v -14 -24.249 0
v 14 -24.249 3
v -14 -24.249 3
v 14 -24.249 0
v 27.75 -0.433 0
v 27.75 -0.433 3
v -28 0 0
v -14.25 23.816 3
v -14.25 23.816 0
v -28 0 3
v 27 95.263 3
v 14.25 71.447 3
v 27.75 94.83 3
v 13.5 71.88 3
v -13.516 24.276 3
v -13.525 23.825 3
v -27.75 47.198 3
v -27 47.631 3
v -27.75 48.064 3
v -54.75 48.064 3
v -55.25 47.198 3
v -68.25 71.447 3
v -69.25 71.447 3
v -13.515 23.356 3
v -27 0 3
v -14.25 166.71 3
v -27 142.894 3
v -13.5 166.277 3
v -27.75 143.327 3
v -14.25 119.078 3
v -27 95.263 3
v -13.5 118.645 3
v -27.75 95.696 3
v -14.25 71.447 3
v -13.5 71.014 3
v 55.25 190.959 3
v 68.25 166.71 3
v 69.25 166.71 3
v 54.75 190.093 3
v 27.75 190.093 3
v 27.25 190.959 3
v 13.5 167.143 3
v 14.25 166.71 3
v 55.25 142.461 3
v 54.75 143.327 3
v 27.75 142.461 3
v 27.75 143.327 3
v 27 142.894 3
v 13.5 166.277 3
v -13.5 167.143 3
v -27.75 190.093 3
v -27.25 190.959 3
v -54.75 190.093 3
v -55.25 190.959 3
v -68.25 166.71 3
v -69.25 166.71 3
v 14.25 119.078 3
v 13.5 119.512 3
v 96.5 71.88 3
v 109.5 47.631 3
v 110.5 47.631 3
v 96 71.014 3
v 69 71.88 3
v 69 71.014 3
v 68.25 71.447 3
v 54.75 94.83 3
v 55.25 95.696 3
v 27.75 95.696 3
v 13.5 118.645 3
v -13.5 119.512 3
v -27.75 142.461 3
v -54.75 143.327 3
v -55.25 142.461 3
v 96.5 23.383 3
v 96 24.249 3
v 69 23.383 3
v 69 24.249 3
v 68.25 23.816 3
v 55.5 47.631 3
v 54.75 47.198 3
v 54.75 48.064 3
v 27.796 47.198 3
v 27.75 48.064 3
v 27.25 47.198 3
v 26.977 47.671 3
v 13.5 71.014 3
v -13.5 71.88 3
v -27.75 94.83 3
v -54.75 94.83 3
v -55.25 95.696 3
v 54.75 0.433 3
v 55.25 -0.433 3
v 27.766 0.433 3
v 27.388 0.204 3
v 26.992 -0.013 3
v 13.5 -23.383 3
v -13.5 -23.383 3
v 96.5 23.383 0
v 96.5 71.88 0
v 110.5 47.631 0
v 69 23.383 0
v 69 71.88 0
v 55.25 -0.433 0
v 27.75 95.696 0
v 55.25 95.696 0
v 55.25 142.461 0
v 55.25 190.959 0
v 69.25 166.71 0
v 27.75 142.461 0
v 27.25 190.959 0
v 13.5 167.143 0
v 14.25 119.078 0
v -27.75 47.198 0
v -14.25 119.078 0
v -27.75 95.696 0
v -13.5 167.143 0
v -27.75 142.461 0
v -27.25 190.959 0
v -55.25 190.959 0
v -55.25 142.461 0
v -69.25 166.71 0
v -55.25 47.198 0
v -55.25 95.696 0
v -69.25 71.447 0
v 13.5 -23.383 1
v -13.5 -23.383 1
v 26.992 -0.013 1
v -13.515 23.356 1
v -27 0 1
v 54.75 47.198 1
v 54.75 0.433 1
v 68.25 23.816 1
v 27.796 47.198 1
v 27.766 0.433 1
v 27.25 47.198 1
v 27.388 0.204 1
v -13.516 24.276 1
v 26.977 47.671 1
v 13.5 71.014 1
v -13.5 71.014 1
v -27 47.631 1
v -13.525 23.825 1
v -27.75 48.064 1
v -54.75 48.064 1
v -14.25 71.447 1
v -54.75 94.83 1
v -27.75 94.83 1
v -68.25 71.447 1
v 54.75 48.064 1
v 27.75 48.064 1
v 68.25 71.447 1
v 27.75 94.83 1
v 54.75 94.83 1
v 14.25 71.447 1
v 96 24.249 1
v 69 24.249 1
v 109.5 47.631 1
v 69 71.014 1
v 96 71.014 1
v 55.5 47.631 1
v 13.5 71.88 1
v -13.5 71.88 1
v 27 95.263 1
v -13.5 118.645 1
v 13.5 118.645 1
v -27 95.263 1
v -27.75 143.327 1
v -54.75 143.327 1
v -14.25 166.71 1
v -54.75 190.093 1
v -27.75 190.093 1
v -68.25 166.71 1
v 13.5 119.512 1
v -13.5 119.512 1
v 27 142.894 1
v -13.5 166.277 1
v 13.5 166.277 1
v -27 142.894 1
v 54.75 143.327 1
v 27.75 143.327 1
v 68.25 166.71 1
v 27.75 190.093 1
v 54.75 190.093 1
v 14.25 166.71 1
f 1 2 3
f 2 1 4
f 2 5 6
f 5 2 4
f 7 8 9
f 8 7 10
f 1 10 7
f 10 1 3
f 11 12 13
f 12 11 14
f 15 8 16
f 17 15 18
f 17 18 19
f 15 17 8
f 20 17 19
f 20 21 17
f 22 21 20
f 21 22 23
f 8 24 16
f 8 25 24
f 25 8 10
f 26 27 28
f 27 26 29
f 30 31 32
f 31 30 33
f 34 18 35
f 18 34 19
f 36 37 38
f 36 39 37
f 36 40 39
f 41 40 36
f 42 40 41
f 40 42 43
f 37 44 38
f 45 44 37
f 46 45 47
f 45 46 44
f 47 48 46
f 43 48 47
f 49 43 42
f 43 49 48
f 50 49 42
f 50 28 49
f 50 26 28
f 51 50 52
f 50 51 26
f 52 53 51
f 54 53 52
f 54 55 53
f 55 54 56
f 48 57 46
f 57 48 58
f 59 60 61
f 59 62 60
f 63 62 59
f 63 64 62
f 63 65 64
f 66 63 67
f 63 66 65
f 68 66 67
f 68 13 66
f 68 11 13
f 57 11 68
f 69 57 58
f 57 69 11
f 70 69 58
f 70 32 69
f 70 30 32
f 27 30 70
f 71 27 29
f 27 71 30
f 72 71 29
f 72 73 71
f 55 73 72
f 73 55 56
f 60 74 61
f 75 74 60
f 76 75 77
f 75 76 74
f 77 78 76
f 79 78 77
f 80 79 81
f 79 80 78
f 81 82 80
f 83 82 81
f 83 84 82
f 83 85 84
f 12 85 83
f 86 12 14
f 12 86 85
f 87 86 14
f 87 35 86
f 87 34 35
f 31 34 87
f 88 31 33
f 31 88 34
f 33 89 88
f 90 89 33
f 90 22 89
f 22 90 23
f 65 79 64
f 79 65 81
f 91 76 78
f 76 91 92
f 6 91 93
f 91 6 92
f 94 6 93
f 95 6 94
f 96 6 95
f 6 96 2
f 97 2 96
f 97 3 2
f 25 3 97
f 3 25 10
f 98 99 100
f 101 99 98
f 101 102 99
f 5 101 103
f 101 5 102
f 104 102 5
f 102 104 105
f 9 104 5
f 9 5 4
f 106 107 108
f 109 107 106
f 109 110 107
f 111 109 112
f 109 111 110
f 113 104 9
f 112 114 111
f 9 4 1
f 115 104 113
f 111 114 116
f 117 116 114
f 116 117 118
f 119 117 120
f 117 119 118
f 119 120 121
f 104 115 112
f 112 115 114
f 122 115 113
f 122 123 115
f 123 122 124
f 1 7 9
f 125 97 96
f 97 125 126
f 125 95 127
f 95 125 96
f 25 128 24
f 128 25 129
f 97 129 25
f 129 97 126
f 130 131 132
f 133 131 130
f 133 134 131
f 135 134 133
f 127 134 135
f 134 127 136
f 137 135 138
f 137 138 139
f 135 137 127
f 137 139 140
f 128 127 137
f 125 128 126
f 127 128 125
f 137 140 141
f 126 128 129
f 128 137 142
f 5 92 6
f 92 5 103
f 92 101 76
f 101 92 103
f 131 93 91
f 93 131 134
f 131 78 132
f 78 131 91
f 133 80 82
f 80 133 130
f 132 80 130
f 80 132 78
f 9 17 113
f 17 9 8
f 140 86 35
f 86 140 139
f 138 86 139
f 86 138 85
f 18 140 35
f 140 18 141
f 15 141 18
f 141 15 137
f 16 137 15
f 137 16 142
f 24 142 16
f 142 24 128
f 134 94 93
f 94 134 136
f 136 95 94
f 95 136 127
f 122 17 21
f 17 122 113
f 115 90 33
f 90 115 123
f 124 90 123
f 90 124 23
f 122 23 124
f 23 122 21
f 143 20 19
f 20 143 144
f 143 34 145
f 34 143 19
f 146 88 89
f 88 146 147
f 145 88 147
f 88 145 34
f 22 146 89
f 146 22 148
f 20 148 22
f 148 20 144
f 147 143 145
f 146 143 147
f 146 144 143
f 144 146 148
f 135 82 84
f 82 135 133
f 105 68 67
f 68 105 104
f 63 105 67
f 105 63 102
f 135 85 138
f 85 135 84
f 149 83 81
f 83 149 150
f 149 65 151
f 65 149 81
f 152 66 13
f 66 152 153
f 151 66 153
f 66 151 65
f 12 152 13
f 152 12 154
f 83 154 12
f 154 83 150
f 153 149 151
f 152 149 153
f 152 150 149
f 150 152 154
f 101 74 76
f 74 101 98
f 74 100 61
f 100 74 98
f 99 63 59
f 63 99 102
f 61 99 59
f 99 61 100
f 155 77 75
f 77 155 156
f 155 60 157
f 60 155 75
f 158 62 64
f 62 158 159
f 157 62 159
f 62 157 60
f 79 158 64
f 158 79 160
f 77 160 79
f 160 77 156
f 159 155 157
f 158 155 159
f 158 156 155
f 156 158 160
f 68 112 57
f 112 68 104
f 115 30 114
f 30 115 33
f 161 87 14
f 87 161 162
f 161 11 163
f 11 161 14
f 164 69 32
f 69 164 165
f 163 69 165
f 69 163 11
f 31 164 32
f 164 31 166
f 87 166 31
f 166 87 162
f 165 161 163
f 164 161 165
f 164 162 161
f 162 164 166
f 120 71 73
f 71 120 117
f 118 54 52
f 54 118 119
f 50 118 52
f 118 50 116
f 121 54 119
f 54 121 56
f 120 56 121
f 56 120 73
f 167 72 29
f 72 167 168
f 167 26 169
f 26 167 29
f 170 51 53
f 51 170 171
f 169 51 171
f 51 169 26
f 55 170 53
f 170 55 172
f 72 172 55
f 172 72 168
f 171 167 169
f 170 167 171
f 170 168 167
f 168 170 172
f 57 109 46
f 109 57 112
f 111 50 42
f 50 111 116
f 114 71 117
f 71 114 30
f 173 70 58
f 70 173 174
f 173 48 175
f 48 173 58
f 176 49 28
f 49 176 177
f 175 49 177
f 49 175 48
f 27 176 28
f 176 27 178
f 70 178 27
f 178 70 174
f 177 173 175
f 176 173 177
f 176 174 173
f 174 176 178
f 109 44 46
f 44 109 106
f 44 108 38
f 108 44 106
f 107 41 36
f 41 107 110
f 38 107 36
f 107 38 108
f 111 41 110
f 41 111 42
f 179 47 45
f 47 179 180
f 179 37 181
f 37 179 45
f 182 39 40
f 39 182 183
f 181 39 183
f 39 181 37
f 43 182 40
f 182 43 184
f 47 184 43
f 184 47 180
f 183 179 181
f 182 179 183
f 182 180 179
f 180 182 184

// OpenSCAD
$fn = 150;

union() {
	difference() {
		union() {
			translate(v = [0.0, 0.0, 0]) {
				difference() {
					cylinder($fn = 6, d = 56.0, h = 3.0);
					translate(v = [0, 0, 1.0]) {
						cylinder($fn = 6, d = 54.0, h = 3.0);
					}
				}
			}
			translate(v = [41.25, 23.81569860407206, 0]) {
				difference() {
					cylinder($fn = 6, d = 56.0, h = 3.0);
					translate(v = [0, 0, 1.0]) {
						cylinder($fn = 6, d = 54.0, h = 3.0);
					}
				}
			}
			translate(v = [0.0, 47.63139720814412, 0]) {
				difference() {
					cylinder($fn = 6, d = 56.0, h = 3.0);
					translate(v = [0, 0, 1.0]) {
						cylinder($fn = 6, d = 54.0, h = 3.0);
					}
				}
			}
		}
		translate(v = [13.75, 23.824673200287624, 1.0]) {
			cylinder(d = 54.55, h = 3.0);
		}
	}
	translate(v = [-41.25, 71.44709581221619, 0]) {
		difference() {
			cylinder($fn = 6, d = 56.0, h = 3.0);
			translate(v = [0, 0, 1.0]) {
				cylinder($fn = 6, d = 54.0, h = 3.0);
			}
		}
	}
	translate(v = [41.25, 71.44709581221619, 0]) {
		difference() {
			cylinder($fn = 6, d = 56.0, h = 3.0);
			translate(v = [0, 0, 1.0]) {
				cylinder($fn = 6, d = 54.0, h = 3.0);
			}
		}
	}
	translate(v = [82.5, 47.63139720814412, 0]) {
		difference() {
			cylinder($fn = 6, d = 56.0, h = 3.0);
			translate(v = [0, 0, 1.0]) {
				cylinder($fn = 6, d = 54.0, h = 3.0);
			}
		}
	}
	translate(v = [0.0, 95.26279441628824, 0]) {
		difference() {
			cylinder($fn = 6, d = 56.0, h = 3.0);
			translate(v = [0, 0, 1.0]) {
				cylinder($fn = 6, d = 54.0, h = 3.0);
			}
		}
	}
	translate(v = [-41.25, 166.70989022850443, 0]) {
		difference() {
			cylinder($fn = 6, d = 56.0, h = 3.0);
			translate(v = [0, 0, 1.0]) {
				cylinder($fn = 6, d = 54.0, h = 3.0);
			}
		}
	}
	translate(v = [0.0, 142.89419162443238, 0]) {
		difference() {
			cylinder($fn = 6, d = 56.0, h = 3.0);
			translate(v = [0, 0, 1.0]) {
				cylinder($fn = 6, d = 54.0, h = 3.0);
			}
		}
	}
	translate(v = [41.25, 166.70989022850443, 0]) {
		difference() {
			cylinder($fn = 6, d = 56.0, h = 3.0);
			translate(v = [0, 0, 1.0]) {
				cylinder($fn = 6, d = 54.0, h = 3.0);
			}
		}
	}
}
